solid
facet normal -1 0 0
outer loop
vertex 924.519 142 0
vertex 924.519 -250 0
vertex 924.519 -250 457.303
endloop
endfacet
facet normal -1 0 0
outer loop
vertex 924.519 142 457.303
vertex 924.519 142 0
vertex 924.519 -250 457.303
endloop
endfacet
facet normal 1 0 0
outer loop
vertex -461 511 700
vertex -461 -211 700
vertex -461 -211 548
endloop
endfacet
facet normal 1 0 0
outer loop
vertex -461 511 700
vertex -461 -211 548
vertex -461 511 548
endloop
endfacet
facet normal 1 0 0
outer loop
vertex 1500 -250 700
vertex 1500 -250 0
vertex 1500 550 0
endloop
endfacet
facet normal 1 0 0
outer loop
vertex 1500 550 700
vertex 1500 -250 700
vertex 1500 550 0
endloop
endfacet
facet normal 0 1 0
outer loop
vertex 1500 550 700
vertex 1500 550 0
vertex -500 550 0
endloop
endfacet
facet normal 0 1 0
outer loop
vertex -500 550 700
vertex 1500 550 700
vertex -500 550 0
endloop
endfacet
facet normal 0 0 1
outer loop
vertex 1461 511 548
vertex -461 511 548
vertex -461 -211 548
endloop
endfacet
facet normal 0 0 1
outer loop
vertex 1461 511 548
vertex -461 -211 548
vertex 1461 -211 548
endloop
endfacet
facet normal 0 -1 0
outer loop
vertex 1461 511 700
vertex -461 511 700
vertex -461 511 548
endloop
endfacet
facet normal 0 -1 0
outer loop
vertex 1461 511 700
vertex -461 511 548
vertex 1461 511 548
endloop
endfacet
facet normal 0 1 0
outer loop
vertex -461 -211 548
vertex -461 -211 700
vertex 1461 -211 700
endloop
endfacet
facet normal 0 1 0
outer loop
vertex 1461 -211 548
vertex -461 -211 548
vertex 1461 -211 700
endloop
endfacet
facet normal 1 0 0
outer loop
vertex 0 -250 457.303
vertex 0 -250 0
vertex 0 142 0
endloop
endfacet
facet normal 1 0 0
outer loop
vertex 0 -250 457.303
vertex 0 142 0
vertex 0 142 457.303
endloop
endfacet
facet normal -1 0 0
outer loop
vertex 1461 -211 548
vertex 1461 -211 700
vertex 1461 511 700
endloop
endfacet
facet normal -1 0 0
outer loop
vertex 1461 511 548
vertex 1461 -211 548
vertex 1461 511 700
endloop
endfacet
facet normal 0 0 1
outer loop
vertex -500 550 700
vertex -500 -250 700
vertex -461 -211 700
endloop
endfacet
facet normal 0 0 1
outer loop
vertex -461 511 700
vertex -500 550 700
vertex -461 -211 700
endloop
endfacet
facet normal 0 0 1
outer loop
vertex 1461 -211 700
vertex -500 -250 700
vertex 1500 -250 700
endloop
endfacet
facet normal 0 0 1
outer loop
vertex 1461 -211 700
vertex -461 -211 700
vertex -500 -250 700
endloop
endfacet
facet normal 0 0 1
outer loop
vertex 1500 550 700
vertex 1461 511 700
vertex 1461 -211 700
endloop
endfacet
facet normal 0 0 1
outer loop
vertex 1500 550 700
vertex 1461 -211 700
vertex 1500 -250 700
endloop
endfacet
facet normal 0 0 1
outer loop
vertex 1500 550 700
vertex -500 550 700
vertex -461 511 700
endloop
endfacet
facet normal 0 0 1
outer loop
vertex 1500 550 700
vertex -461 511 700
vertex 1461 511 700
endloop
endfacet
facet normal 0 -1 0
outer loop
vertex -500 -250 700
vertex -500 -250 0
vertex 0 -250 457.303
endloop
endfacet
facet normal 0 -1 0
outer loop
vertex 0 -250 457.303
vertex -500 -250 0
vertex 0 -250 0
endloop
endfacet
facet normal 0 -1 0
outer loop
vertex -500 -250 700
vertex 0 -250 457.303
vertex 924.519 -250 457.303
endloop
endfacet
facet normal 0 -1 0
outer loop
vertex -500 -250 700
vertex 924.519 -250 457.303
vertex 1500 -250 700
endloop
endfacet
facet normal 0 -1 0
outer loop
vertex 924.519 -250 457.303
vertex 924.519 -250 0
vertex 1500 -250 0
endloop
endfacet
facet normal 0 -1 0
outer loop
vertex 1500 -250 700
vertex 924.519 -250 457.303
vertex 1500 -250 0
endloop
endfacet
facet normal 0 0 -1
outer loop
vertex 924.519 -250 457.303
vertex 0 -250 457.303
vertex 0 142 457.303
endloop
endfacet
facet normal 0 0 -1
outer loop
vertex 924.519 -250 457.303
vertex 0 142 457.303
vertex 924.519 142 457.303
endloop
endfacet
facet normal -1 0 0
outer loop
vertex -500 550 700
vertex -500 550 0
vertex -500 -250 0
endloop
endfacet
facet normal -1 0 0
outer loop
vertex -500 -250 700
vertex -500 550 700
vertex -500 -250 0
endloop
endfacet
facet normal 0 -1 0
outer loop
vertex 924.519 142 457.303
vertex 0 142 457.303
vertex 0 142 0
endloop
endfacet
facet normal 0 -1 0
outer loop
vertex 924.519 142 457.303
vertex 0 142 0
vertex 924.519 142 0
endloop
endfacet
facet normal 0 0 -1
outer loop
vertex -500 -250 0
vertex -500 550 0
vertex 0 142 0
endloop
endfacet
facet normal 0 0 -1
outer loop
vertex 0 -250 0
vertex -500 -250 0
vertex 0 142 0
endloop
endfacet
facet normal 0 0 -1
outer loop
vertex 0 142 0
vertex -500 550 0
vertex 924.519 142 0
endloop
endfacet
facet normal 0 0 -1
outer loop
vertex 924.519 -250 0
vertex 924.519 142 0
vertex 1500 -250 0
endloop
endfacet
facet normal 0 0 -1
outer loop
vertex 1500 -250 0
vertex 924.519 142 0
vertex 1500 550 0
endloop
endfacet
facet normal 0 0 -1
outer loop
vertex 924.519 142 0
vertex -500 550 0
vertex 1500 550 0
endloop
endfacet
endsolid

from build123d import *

# Parameters (mm, degrees)
F1_DEPTH = 700
F2_W     = 924.519062
F2_H     = 457.303435
F3_DEPTH = 392
F4_W     = 1921.999932
F4_H     = 721.999932
F5_DEPTH = 152


with BuildPart() as f1:
    # F0 (on Top) → F1 (new body)
    with BuildSketch(Plane.XY):
        Polygon((-500, -250), (0, -250), (1500, -250), (1500, 0), (1500, 550), (-500, 550), align=None)
    extrude(amount=F1_DEPTH)

    # F2 (on face) → F3 (cut)
    with BuildSketch(Plane.XZ.offset(250)):
        with Locations((462.259531, 228.651717)):
            Rectangle(F2_W, F2_H)
    extrude(amount=-F3_DEPTH, mode=Mode.SUBTRACT)

    # F4 (on face) → F5 (cut)
    with BuildSketch(Plane.XY.offset(700)):
        with Locations((500, 150)):
            Rectangle(F4_W, F4_H)
    extrude(amount=-F5_DEPTH, mode=Mode.SUBTRACT)


solid = f1.part
